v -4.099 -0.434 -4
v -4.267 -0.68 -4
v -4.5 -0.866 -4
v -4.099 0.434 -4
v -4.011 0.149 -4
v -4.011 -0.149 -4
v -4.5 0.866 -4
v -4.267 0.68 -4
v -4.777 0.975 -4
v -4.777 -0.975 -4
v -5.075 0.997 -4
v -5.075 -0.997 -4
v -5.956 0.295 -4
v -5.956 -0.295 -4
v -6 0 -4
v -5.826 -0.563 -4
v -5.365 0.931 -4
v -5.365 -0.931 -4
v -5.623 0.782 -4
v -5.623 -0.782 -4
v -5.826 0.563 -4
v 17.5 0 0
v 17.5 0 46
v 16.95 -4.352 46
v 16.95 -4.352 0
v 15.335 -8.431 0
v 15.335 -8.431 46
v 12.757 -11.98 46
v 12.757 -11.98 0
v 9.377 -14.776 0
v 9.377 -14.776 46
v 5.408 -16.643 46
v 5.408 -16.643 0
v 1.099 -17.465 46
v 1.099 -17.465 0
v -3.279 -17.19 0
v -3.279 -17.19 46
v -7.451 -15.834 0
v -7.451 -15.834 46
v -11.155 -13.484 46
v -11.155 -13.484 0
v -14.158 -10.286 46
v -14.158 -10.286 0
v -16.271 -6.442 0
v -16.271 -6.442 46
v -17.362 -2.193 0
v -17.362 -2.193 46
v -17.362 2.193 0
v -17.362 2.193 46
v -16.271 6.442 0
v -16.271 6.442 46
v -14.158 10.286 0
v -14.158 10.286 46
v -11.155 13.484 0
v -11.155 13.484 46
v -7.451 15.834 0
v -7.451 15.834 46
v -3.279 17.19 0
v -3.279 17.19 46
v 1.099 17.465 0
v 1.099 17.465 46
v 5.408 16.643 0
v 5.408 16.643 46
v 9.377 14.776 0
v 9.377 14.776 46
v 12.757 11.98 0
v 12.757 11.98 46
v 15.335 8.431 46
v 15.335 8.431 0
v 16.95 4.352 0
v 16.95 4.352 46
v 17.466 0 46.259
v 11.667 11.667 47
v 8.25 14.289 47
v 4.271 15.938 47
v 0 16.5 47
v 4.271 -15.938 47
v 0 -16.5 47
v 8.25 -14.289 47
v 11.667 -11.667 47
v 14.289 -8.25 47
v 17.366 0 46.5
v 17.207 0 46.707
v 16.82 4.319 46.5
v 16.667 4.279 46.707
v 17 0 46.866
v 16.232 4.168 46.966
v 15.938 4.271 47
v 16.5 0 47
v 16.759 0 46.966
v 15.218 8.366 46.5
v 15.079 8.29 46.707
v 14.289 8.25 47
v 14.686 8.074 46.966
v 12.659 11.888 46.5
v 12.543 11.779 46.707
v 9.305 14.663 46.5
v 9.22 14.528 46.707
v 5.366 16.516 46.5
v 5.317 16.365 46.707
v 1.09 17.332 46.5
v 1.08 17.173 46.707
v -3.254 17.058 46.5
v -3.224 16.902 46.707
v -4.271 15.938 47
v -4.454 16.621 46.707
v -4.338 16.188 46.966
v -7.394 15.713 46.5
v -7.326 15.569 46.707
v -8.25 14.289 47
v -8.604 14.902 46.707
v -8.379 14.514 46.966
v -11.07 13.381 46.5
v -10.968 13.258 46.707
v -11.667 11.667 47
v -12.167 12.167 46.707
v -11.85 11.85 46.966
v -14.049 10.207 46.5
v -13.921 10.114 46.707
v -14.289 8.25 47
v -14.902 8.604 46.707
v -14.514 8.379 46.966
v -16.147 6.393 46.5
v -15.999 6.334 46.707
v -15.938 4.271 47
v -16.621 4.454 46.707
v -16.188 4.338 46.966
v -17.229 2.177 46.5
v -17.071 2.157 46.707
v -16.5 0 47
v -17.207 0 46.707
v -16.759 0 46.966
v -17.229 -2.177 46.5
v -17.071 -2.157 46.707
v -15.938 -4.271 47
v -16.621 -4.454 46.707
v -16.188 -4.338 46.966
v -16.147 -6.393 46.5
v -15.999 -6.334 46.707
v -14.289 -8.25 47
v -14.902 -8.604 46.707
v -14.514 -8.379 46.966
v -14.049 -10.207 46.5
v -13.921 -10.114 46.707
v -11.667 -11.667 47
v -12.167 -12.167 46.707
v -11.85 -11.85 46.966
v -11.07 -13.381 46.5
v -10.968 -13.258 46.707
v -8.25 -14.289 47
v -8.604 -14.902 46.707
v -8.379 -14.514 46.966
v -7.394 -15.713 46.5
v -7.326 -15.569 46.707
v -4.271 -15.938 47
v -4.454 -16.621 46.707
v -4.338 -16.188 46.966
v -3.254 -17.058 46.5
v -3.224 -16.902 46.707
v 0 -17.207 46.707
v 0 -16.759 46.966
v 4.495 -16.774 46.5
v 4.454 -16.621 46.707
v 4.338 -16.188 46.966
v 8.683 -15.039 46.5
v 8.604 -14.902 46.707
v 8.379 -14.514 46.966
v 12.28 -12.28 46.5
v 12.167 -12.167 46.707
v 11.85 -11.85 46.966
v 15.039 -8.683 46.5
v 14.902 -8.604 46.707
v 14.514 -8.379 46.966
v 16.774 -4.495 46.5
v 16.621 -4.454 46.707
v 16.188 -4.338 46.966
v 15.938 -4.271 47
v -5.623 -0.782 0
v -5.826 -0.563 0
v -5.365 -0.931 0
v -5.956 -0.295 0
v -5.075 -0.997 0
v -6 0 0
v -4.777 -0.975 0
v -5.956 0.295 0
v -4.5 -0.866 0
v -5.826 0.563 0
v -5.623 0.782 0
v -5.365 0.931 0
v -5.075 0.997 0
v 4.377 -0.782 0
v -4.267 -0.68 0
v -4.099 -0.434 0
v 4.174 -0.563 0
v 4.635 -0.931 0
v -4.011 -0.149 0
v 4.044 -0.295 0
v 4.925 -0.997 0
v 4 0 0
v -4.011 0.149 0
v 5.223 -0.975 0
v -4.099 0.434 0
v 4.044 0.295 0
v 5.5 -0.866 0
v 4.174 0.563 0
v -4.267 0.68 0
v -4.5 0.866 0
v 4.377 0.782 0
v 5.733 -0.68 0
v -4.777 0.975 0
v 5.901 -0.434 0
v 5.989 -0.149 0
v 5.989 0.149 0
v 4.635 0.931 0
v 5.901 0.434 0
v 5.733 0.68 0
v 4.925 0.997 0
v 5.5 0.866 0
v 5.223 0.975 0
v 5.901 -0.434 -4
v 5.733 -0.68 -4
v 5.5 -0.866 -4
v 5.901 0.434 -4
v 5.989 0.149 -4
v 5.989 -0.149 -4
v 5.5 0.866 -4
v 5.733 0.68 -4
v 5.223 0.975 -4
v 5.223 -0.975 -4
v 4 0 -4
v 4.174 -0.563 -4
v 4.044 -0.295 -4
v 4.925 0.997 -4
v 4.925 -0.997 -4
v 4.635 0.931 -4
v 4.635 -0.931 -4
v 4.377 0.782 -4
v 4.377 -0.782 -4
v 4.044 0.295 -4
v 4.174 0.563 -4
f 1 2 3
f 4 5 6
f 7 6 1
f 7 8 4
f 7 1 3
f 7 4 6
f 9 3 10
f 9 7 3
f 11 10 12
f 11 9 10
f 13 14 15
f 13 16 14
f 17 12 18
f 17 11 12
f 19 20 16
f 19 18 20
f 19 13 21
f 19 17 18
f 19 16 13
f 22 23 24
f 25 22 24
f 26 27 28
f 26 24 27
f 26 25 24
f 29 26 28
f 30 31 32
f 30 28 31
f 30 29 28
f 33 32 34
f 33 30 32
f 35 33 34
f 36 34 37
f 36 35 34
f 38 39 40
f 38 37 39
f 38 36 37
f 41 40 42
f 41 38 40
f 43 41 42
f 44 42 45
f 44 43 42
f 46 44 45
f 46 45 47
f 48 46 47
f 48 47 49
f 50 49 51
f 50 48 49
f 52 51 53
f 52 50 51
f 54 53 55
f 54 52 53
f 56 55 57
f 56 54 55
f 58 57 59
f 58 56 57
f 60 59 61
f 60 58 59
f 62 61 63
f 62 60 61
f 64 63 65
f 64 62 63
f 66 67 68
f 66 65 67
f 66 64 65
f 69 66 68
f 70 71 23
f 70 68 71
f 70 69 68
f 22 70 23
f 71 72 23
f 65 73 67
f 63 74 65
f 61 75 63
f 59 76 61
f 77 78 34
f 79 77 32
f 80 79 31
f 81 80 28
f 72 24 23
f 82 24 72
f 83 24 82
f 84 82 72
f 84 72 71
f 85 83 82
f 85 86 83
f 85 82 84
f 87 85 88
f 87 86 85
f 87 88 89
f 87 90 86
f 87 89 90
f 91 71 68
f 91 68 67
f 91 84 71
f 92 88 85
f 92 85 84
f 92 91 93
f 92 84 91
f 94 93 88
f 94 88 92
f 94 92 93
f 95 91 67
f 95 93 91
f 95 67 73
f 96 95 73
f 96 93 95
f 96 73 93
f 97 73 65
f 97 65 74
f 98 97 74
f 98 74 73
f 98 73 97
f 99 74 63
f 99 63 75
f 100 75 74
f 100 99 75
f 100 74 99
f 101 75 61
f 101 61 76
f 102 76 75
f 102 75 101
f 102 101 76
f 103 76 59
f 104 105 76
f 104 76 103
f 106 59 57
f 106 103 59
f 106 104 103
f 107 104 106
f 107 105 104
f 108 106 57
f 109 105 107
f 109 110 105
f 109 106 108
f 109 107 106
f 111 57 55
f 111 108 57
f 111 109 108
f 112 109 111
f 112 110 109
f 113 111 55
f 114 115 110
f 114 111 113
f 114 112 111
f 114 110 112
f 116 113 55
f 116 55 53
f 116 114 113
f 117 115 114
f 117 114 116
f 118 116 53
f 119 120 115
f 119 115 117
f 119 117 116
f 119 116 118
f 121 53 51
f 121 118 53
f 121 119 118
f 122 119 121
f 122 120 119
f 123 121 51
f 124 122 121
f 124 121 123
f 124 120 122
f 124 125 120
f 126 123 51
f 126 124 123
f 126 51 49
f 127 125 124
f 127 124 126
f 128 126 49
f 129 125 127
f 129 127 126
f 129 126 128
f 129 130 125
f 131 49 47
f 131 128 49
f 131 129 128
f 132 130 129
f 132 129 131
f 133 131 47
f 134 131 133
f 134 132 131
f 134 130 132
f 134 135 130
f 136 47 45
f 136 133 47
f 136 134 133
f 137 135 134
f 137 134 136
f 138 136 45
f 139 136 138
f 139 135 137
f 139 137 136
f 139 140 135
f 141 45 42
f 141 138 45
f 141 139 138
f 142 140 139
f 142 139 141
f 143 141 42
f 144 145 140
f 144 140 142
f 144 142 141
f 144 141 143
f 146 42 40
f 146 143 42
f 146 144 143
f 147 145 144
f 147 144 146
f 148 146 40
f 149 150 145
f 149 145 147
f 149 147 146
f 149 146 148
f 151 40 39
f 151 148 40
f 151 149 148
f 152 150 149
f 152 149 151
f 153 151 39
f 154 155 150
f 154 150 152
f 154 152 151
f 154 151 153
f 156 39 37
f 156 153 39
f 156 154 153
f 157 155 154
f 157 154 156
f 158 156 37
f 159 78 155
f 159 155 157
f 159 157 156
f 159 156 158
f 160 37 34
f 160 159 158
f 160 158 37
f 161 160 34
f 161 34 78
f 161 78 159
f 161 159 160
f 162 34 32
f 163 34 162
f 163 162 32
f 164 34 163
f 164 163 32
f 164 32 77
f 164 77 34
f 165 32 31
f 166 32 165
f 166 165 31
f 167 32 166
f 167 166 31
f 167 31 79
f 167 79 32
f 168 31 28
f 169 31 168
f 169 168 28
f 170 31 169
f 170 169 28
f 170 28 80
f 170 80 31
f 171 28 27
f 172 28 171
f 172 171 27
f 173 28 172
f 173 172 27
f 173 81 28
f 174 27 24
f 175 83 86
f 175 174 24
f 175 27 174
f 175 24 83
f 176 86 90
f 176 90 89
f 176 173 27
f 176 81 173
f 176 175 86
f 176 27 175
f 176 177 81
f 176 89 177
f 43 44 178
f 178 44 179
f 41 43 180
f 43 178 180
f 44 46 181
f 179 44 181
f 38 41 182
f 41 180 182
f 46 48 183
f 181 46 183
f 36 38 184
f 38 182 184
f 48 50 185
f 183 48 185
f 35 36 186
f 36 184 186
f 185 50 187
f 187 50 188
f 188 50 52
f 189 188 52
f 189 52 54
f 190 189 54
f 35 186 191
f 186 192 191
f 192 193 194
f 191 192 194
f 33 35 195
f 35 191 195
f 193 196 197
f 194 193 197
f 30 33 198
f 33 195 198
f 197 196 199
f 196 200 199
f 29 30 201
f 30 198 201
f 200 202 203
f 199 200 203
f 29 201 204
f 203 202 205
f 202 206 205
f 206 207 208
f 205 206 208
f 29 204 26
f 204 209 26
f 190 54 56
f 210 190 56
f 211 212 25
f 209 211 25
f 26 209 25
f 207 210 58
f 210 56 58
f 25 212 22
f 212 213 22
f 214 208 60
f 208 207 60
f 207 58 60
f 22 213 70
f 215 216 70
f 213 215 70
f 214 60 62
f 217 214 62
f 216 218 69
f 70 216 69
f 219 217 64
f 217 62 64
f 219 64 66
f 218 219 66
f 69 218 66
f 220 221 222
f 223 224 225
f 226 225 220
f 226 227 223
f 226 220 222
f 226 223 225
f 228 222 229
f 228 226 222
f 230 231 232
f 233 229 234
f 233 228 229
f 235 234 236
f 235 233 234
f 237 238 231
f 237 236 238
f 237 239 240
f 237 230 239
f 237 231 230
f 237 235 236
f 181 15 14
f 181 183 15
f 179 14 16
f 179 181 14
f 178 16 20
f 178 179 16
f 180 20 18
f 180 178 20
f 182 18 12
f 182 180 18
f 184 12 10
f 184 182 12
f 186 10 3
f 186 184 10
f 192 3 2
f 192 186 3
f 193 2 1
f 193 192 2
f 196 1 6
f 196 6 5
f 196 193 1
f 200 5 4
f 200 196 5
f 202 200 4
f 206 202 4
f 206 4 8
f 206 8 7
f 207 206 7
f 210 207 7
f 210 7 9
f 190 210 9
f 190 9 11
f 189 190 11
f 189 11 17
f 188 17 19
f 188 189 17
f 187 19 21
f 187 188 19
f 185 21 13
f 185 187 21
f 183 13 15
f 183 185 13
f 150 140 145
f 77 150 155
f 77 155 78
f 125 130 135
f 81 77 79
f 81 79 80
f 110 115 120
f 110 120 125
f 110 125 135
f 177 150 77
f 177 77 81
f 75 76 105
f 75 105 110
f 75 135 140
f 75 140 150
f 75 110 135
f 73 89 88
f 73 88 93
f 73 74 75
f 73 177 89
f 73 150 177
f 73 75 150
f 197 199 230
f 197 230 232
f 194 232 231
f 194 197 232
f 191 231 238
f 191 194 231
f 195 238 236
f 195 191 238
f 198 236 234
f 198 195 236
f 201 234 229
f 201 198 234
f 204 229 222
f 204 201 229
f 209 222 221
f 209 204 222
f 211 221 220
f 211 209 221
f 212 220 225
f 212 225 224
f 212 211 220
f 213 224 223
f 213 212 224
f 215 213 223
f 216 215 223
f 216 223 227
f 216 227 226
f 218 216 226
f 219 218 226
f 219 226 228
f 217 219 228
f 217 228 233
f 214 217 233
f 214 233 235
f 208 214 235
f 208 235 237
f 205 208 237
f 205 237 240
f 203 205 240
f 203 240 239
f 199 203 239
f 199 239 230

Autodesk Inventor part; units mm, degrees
ref_plane "YZ Plane" through (0, 0, 0) normal (1, 0, 0) x (0, 1, 0)
ref_plane "XY Plane" through (0, 0, 0) normal (0, 0, 1) x (1, 0, 0)
sketch "Skizze1" plane through (0, 0, 0) normal (0, 0, 1) x (1, 0, 0)
  circle A0 centre (0, 0) radius 17.5
  dimension "d0" = 35
extrude "Extrusion1" add sketch "Skizze1" along normal blind 47
fillet "Rundung1" radius 1 1 edges at (-17.5, 0, 47)
sketch "Skizze2" plane through (0, 0, 0) normal (0, 0, -1) x (-1, 0, 0)
  line L0 (-24.5, 0) -> (24.5, 0) projected
  line L1 (0, -24.5) -> (0, 24.5) projected
  circle A0 centre (-5, 0) radius 1
  circle A1 centre (5, 0) radius 1
  dimension "d4" = 10
  dimension "d5" = 2
extrude "Extrusion2" add sketch "Skizze2" along normal blind 4
ref_plane "Arbeitsebene1" through (0, 0, 0) normal (0, 1, 0) x (-1, 0, 0)
properties part number "Kondensator 30x50" material "PC/ABS-Kunststoff"
